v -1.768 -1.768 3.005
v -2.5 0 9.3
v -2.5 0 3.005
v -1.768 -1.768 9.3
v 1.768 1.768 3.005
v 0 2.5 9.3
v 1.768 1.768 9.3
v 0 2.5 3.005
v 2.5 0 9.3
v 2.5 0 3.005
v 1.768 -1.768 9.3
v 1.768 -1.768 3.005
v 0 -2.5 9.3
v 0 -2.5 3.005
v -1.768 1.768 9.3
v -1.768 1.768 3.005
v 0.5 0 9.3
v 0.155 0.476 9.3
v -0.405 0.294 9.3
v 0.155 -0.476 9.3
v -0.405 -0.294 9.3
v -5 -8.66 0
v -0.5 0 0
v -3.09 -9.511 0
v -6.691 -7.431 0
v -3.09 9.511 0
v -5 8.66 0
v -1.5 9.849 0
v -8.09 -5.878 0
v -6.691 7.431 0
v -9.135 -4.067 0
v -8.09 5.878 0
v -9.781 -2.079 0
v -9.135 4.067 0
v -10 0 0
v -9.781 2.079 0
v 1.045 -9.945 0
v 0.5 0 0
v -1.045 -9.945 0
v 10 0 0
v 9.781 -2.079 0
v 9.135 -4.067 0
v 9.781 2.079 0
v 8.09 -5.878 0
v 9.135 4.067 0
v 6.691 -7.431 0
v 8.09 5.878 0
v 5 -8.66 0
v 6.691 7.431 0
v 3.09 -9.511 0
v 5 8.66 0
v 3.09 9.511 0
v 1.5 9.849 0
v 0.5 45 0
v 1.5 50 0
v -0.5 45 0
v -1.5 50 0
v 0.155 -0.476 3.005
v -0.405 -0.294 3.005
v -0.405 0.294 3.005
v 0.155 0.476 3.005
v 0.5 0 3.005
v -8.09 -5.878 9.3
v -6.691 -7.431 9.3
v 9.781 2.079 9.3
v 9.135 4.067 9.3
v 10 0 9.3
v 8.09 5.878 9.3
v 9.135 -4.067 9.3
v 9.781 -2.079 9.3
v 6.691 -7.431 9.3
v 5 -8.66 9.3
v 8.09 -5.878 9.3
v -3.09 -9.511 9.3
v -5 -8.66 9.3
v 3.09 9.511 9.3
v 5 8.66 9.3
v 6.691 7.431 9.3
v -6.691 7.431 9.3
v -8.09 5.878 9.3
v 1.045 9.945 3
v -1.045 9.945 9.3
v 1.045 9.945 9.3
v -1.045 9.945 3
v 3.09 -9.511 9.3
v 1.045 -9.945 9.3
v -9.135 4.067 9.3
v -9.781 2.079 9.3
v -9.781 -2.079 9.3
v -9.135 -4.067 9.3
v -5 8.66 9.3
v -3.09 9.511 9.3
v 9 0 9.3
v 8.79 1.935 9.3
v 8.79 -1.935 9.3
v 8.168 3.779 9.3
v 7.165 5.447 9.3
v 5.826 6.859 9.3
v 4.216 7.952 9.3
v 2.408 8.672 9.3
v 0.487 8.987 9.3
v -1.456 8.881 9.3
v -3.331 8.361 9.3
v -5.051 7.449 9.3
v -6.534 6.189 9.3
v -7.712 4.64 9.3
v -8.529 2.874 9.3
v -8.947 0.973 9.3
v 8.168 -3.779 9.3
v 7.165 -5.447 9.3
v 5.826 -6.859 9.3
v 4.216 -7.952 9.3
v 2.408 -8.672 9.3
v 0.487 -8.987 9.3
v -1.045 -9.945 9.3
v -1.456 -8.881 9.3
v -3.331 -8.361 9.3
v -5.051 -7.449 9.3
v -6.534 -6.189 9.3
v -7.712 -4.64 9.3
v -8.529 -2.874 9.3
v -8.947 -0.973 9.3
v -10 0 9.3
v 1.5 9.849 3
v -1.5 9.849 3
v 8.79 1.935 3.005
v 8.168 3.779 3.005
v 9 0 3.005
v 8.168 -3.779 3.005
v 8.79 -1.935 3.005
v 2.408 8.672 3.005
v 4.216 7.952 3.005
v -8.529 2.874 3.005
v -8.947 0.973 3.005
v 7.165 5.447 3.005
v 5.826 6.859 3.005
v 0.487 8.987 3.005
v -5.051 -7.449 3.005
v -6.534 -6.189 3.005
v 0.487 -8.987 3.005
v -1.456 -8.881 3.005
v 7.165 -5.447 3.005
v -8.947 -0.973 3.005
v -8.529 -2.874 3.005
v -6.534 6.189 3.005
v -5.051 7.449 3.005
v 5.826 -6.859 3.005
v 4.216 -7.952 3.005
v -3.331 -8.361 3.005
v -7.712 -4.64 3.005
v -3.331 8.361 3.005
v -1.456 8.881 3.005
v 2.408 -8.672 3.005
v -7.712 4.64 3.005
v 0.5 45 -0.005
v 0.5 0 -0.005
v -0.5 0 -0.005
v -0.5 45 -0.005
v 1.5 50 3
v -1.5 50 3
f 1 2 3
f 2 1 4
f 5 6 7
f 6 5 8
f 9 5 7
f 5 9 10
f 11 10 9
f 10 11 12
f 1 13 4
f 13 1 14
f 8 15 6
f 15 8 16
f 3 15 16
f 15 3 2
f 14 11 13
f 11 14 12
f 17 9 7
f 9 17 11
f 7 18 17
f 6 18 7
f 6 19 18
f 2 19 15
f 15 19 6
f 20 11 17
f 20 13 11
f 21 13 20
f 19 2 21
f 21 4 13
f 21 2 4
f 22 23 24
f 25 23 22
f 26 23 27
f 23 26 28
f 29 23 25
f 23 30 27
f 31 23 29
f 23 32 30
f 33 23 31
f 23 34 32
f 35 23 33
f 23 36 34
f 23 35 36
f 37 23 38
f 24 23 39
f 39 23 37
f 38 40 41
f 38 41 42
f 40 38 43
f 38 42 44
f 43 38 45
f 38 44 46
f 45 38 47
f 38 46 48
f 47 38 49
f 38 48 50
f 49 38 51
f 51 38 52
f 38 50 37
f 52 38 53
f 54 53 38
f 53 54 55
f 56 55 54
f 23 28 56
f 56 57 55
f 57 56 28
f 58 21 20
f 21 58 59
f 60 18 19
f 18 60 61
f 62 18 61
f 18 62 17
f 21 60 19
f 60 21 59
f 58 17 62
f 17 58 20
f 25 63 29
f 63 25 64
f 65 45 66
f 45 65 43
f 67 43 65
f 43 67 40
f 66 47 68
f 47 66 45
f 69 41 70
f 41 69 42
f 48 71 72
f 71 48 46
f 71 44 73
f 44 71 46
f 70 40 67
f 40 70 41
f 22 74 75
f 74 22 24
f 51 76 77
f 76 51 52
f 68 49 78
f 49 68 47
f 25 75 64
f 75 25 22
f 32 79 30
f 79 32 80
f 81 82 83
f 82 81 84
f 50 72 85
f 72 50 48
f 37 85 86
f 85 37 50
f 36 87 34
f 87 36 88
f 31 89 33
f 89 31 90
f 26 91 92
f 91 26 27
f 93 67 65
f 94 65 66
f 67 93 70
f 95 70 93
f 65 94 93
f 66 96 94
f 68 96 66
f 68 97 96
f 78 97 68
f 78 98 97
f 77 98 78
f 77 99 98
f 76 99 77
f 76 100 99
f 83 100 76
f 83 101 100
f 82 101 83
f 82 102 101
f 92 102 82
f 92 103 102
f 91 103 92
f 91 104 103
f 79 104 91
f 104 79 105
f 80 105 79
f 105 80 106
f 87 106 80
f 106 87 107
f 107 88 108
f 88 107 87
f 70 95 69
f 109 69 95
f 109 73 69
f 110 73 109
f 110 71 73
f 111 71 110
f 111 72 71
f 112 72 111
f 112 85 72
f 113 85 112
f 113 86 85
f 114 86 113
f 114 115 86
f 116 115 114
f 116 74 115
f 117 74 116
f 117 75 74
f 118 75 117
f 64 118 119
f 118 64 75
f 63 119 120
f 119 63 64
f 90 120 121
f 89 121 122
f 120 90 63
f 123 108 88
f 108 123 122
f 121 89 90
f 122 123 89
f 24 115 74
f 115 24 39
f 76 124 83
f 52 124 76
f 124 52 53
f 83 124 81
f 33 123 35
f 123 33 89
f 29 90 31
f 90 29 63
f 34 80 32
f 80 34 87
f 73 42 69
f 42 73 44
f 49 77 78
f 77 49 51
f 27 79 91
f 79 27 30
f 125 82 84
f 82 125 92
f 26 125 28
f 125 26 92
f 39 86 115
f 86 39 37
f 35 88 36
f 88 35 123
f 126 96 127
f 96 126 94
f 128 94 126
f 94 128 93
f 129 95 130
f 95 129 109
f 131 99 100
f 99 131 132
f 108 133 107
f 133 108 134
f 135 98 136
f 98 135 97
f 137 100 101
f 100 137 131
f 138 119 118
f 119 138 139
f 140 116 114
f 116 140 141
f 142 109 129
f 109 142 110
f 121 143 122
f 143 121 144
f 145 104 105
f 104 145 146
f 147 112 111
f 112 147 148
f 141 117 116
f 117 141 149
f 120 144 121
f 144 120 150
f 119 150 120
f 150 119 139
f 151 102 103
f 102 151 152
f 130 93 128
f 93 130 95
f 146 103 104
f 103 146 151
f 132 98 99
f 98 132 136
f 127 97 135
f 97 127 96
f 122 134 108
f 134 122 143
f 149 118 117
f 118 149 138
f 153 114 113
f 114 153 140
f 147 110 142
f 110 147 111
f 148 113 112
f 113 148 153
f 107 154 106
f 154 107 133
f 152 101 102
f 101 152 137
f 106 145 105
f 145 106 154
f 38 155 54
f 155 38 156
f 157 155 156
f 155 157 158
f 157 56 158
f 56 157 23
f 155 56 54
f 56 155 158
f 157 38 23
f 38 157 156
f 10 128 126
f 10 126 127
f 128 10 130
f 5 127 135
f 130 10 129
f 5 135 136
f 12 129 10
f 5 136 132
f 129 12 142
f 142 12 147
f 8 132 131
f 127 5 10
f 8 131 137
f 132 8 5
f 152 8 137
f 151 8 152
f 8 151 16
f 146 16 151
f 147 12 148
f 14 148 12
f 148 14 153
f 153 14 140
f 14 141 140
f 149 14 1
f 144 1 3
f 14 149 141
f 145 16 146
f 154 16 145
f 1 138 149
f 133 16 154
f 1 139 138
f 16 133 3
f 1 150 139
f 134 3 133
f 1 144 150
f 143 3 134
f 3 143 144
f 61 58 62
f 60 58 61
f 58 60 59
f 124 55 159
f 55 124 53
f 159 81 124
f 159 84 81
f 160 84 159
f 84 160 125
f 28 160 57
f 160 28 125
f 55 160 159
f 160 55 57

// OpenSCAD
outsideR=10;
minWidth=1;
holeHeight=10.9-1.6;
holeR=0.5;

needleWidth=3;
needleLength=50;
tracerWidth=1;
tracerLength=needleLength-5;
tracerDepth=2;
var=.01;
var2=.005;
/* Hole holder */ 
difference(){
	cylinder(r=holeR+2*minWidth, h=holeHeight);
	translate([0,0,-var2])
	cylinder(r=holeR, h=holeHeight+var);
}
/* Outside  */ 
difference(){
	cylinder(r=outsideR, h=holeHeight);
	translate([0,0,-var2])
	cylinder(r=outsideR-tracerWidth, h=holeHeight+var);
}
/* Top of the needle */ 
cylinder(r=outsideR, h=minWidth);

/* Outside needle */ 
module needle(){
translate([-needleWidth/2, outsideR-minWidth,0])
cube([needleWidth,needleLength-outsideR+minWidth,needleWidth]);
}
module tracer(){
	/* Inside needle */ 
	color("blue"){
		translate([-tracerWidth/2, 0,-var2])
			cube([tracerWidth,tracerLength,tracerDepth]);
		translate([0,0,1])
			cylinder(r=outsideR-minWidth, h=tracerDepth+var2);
	}
}
difference(){
	needle();
	tracer();
}
tracer();
